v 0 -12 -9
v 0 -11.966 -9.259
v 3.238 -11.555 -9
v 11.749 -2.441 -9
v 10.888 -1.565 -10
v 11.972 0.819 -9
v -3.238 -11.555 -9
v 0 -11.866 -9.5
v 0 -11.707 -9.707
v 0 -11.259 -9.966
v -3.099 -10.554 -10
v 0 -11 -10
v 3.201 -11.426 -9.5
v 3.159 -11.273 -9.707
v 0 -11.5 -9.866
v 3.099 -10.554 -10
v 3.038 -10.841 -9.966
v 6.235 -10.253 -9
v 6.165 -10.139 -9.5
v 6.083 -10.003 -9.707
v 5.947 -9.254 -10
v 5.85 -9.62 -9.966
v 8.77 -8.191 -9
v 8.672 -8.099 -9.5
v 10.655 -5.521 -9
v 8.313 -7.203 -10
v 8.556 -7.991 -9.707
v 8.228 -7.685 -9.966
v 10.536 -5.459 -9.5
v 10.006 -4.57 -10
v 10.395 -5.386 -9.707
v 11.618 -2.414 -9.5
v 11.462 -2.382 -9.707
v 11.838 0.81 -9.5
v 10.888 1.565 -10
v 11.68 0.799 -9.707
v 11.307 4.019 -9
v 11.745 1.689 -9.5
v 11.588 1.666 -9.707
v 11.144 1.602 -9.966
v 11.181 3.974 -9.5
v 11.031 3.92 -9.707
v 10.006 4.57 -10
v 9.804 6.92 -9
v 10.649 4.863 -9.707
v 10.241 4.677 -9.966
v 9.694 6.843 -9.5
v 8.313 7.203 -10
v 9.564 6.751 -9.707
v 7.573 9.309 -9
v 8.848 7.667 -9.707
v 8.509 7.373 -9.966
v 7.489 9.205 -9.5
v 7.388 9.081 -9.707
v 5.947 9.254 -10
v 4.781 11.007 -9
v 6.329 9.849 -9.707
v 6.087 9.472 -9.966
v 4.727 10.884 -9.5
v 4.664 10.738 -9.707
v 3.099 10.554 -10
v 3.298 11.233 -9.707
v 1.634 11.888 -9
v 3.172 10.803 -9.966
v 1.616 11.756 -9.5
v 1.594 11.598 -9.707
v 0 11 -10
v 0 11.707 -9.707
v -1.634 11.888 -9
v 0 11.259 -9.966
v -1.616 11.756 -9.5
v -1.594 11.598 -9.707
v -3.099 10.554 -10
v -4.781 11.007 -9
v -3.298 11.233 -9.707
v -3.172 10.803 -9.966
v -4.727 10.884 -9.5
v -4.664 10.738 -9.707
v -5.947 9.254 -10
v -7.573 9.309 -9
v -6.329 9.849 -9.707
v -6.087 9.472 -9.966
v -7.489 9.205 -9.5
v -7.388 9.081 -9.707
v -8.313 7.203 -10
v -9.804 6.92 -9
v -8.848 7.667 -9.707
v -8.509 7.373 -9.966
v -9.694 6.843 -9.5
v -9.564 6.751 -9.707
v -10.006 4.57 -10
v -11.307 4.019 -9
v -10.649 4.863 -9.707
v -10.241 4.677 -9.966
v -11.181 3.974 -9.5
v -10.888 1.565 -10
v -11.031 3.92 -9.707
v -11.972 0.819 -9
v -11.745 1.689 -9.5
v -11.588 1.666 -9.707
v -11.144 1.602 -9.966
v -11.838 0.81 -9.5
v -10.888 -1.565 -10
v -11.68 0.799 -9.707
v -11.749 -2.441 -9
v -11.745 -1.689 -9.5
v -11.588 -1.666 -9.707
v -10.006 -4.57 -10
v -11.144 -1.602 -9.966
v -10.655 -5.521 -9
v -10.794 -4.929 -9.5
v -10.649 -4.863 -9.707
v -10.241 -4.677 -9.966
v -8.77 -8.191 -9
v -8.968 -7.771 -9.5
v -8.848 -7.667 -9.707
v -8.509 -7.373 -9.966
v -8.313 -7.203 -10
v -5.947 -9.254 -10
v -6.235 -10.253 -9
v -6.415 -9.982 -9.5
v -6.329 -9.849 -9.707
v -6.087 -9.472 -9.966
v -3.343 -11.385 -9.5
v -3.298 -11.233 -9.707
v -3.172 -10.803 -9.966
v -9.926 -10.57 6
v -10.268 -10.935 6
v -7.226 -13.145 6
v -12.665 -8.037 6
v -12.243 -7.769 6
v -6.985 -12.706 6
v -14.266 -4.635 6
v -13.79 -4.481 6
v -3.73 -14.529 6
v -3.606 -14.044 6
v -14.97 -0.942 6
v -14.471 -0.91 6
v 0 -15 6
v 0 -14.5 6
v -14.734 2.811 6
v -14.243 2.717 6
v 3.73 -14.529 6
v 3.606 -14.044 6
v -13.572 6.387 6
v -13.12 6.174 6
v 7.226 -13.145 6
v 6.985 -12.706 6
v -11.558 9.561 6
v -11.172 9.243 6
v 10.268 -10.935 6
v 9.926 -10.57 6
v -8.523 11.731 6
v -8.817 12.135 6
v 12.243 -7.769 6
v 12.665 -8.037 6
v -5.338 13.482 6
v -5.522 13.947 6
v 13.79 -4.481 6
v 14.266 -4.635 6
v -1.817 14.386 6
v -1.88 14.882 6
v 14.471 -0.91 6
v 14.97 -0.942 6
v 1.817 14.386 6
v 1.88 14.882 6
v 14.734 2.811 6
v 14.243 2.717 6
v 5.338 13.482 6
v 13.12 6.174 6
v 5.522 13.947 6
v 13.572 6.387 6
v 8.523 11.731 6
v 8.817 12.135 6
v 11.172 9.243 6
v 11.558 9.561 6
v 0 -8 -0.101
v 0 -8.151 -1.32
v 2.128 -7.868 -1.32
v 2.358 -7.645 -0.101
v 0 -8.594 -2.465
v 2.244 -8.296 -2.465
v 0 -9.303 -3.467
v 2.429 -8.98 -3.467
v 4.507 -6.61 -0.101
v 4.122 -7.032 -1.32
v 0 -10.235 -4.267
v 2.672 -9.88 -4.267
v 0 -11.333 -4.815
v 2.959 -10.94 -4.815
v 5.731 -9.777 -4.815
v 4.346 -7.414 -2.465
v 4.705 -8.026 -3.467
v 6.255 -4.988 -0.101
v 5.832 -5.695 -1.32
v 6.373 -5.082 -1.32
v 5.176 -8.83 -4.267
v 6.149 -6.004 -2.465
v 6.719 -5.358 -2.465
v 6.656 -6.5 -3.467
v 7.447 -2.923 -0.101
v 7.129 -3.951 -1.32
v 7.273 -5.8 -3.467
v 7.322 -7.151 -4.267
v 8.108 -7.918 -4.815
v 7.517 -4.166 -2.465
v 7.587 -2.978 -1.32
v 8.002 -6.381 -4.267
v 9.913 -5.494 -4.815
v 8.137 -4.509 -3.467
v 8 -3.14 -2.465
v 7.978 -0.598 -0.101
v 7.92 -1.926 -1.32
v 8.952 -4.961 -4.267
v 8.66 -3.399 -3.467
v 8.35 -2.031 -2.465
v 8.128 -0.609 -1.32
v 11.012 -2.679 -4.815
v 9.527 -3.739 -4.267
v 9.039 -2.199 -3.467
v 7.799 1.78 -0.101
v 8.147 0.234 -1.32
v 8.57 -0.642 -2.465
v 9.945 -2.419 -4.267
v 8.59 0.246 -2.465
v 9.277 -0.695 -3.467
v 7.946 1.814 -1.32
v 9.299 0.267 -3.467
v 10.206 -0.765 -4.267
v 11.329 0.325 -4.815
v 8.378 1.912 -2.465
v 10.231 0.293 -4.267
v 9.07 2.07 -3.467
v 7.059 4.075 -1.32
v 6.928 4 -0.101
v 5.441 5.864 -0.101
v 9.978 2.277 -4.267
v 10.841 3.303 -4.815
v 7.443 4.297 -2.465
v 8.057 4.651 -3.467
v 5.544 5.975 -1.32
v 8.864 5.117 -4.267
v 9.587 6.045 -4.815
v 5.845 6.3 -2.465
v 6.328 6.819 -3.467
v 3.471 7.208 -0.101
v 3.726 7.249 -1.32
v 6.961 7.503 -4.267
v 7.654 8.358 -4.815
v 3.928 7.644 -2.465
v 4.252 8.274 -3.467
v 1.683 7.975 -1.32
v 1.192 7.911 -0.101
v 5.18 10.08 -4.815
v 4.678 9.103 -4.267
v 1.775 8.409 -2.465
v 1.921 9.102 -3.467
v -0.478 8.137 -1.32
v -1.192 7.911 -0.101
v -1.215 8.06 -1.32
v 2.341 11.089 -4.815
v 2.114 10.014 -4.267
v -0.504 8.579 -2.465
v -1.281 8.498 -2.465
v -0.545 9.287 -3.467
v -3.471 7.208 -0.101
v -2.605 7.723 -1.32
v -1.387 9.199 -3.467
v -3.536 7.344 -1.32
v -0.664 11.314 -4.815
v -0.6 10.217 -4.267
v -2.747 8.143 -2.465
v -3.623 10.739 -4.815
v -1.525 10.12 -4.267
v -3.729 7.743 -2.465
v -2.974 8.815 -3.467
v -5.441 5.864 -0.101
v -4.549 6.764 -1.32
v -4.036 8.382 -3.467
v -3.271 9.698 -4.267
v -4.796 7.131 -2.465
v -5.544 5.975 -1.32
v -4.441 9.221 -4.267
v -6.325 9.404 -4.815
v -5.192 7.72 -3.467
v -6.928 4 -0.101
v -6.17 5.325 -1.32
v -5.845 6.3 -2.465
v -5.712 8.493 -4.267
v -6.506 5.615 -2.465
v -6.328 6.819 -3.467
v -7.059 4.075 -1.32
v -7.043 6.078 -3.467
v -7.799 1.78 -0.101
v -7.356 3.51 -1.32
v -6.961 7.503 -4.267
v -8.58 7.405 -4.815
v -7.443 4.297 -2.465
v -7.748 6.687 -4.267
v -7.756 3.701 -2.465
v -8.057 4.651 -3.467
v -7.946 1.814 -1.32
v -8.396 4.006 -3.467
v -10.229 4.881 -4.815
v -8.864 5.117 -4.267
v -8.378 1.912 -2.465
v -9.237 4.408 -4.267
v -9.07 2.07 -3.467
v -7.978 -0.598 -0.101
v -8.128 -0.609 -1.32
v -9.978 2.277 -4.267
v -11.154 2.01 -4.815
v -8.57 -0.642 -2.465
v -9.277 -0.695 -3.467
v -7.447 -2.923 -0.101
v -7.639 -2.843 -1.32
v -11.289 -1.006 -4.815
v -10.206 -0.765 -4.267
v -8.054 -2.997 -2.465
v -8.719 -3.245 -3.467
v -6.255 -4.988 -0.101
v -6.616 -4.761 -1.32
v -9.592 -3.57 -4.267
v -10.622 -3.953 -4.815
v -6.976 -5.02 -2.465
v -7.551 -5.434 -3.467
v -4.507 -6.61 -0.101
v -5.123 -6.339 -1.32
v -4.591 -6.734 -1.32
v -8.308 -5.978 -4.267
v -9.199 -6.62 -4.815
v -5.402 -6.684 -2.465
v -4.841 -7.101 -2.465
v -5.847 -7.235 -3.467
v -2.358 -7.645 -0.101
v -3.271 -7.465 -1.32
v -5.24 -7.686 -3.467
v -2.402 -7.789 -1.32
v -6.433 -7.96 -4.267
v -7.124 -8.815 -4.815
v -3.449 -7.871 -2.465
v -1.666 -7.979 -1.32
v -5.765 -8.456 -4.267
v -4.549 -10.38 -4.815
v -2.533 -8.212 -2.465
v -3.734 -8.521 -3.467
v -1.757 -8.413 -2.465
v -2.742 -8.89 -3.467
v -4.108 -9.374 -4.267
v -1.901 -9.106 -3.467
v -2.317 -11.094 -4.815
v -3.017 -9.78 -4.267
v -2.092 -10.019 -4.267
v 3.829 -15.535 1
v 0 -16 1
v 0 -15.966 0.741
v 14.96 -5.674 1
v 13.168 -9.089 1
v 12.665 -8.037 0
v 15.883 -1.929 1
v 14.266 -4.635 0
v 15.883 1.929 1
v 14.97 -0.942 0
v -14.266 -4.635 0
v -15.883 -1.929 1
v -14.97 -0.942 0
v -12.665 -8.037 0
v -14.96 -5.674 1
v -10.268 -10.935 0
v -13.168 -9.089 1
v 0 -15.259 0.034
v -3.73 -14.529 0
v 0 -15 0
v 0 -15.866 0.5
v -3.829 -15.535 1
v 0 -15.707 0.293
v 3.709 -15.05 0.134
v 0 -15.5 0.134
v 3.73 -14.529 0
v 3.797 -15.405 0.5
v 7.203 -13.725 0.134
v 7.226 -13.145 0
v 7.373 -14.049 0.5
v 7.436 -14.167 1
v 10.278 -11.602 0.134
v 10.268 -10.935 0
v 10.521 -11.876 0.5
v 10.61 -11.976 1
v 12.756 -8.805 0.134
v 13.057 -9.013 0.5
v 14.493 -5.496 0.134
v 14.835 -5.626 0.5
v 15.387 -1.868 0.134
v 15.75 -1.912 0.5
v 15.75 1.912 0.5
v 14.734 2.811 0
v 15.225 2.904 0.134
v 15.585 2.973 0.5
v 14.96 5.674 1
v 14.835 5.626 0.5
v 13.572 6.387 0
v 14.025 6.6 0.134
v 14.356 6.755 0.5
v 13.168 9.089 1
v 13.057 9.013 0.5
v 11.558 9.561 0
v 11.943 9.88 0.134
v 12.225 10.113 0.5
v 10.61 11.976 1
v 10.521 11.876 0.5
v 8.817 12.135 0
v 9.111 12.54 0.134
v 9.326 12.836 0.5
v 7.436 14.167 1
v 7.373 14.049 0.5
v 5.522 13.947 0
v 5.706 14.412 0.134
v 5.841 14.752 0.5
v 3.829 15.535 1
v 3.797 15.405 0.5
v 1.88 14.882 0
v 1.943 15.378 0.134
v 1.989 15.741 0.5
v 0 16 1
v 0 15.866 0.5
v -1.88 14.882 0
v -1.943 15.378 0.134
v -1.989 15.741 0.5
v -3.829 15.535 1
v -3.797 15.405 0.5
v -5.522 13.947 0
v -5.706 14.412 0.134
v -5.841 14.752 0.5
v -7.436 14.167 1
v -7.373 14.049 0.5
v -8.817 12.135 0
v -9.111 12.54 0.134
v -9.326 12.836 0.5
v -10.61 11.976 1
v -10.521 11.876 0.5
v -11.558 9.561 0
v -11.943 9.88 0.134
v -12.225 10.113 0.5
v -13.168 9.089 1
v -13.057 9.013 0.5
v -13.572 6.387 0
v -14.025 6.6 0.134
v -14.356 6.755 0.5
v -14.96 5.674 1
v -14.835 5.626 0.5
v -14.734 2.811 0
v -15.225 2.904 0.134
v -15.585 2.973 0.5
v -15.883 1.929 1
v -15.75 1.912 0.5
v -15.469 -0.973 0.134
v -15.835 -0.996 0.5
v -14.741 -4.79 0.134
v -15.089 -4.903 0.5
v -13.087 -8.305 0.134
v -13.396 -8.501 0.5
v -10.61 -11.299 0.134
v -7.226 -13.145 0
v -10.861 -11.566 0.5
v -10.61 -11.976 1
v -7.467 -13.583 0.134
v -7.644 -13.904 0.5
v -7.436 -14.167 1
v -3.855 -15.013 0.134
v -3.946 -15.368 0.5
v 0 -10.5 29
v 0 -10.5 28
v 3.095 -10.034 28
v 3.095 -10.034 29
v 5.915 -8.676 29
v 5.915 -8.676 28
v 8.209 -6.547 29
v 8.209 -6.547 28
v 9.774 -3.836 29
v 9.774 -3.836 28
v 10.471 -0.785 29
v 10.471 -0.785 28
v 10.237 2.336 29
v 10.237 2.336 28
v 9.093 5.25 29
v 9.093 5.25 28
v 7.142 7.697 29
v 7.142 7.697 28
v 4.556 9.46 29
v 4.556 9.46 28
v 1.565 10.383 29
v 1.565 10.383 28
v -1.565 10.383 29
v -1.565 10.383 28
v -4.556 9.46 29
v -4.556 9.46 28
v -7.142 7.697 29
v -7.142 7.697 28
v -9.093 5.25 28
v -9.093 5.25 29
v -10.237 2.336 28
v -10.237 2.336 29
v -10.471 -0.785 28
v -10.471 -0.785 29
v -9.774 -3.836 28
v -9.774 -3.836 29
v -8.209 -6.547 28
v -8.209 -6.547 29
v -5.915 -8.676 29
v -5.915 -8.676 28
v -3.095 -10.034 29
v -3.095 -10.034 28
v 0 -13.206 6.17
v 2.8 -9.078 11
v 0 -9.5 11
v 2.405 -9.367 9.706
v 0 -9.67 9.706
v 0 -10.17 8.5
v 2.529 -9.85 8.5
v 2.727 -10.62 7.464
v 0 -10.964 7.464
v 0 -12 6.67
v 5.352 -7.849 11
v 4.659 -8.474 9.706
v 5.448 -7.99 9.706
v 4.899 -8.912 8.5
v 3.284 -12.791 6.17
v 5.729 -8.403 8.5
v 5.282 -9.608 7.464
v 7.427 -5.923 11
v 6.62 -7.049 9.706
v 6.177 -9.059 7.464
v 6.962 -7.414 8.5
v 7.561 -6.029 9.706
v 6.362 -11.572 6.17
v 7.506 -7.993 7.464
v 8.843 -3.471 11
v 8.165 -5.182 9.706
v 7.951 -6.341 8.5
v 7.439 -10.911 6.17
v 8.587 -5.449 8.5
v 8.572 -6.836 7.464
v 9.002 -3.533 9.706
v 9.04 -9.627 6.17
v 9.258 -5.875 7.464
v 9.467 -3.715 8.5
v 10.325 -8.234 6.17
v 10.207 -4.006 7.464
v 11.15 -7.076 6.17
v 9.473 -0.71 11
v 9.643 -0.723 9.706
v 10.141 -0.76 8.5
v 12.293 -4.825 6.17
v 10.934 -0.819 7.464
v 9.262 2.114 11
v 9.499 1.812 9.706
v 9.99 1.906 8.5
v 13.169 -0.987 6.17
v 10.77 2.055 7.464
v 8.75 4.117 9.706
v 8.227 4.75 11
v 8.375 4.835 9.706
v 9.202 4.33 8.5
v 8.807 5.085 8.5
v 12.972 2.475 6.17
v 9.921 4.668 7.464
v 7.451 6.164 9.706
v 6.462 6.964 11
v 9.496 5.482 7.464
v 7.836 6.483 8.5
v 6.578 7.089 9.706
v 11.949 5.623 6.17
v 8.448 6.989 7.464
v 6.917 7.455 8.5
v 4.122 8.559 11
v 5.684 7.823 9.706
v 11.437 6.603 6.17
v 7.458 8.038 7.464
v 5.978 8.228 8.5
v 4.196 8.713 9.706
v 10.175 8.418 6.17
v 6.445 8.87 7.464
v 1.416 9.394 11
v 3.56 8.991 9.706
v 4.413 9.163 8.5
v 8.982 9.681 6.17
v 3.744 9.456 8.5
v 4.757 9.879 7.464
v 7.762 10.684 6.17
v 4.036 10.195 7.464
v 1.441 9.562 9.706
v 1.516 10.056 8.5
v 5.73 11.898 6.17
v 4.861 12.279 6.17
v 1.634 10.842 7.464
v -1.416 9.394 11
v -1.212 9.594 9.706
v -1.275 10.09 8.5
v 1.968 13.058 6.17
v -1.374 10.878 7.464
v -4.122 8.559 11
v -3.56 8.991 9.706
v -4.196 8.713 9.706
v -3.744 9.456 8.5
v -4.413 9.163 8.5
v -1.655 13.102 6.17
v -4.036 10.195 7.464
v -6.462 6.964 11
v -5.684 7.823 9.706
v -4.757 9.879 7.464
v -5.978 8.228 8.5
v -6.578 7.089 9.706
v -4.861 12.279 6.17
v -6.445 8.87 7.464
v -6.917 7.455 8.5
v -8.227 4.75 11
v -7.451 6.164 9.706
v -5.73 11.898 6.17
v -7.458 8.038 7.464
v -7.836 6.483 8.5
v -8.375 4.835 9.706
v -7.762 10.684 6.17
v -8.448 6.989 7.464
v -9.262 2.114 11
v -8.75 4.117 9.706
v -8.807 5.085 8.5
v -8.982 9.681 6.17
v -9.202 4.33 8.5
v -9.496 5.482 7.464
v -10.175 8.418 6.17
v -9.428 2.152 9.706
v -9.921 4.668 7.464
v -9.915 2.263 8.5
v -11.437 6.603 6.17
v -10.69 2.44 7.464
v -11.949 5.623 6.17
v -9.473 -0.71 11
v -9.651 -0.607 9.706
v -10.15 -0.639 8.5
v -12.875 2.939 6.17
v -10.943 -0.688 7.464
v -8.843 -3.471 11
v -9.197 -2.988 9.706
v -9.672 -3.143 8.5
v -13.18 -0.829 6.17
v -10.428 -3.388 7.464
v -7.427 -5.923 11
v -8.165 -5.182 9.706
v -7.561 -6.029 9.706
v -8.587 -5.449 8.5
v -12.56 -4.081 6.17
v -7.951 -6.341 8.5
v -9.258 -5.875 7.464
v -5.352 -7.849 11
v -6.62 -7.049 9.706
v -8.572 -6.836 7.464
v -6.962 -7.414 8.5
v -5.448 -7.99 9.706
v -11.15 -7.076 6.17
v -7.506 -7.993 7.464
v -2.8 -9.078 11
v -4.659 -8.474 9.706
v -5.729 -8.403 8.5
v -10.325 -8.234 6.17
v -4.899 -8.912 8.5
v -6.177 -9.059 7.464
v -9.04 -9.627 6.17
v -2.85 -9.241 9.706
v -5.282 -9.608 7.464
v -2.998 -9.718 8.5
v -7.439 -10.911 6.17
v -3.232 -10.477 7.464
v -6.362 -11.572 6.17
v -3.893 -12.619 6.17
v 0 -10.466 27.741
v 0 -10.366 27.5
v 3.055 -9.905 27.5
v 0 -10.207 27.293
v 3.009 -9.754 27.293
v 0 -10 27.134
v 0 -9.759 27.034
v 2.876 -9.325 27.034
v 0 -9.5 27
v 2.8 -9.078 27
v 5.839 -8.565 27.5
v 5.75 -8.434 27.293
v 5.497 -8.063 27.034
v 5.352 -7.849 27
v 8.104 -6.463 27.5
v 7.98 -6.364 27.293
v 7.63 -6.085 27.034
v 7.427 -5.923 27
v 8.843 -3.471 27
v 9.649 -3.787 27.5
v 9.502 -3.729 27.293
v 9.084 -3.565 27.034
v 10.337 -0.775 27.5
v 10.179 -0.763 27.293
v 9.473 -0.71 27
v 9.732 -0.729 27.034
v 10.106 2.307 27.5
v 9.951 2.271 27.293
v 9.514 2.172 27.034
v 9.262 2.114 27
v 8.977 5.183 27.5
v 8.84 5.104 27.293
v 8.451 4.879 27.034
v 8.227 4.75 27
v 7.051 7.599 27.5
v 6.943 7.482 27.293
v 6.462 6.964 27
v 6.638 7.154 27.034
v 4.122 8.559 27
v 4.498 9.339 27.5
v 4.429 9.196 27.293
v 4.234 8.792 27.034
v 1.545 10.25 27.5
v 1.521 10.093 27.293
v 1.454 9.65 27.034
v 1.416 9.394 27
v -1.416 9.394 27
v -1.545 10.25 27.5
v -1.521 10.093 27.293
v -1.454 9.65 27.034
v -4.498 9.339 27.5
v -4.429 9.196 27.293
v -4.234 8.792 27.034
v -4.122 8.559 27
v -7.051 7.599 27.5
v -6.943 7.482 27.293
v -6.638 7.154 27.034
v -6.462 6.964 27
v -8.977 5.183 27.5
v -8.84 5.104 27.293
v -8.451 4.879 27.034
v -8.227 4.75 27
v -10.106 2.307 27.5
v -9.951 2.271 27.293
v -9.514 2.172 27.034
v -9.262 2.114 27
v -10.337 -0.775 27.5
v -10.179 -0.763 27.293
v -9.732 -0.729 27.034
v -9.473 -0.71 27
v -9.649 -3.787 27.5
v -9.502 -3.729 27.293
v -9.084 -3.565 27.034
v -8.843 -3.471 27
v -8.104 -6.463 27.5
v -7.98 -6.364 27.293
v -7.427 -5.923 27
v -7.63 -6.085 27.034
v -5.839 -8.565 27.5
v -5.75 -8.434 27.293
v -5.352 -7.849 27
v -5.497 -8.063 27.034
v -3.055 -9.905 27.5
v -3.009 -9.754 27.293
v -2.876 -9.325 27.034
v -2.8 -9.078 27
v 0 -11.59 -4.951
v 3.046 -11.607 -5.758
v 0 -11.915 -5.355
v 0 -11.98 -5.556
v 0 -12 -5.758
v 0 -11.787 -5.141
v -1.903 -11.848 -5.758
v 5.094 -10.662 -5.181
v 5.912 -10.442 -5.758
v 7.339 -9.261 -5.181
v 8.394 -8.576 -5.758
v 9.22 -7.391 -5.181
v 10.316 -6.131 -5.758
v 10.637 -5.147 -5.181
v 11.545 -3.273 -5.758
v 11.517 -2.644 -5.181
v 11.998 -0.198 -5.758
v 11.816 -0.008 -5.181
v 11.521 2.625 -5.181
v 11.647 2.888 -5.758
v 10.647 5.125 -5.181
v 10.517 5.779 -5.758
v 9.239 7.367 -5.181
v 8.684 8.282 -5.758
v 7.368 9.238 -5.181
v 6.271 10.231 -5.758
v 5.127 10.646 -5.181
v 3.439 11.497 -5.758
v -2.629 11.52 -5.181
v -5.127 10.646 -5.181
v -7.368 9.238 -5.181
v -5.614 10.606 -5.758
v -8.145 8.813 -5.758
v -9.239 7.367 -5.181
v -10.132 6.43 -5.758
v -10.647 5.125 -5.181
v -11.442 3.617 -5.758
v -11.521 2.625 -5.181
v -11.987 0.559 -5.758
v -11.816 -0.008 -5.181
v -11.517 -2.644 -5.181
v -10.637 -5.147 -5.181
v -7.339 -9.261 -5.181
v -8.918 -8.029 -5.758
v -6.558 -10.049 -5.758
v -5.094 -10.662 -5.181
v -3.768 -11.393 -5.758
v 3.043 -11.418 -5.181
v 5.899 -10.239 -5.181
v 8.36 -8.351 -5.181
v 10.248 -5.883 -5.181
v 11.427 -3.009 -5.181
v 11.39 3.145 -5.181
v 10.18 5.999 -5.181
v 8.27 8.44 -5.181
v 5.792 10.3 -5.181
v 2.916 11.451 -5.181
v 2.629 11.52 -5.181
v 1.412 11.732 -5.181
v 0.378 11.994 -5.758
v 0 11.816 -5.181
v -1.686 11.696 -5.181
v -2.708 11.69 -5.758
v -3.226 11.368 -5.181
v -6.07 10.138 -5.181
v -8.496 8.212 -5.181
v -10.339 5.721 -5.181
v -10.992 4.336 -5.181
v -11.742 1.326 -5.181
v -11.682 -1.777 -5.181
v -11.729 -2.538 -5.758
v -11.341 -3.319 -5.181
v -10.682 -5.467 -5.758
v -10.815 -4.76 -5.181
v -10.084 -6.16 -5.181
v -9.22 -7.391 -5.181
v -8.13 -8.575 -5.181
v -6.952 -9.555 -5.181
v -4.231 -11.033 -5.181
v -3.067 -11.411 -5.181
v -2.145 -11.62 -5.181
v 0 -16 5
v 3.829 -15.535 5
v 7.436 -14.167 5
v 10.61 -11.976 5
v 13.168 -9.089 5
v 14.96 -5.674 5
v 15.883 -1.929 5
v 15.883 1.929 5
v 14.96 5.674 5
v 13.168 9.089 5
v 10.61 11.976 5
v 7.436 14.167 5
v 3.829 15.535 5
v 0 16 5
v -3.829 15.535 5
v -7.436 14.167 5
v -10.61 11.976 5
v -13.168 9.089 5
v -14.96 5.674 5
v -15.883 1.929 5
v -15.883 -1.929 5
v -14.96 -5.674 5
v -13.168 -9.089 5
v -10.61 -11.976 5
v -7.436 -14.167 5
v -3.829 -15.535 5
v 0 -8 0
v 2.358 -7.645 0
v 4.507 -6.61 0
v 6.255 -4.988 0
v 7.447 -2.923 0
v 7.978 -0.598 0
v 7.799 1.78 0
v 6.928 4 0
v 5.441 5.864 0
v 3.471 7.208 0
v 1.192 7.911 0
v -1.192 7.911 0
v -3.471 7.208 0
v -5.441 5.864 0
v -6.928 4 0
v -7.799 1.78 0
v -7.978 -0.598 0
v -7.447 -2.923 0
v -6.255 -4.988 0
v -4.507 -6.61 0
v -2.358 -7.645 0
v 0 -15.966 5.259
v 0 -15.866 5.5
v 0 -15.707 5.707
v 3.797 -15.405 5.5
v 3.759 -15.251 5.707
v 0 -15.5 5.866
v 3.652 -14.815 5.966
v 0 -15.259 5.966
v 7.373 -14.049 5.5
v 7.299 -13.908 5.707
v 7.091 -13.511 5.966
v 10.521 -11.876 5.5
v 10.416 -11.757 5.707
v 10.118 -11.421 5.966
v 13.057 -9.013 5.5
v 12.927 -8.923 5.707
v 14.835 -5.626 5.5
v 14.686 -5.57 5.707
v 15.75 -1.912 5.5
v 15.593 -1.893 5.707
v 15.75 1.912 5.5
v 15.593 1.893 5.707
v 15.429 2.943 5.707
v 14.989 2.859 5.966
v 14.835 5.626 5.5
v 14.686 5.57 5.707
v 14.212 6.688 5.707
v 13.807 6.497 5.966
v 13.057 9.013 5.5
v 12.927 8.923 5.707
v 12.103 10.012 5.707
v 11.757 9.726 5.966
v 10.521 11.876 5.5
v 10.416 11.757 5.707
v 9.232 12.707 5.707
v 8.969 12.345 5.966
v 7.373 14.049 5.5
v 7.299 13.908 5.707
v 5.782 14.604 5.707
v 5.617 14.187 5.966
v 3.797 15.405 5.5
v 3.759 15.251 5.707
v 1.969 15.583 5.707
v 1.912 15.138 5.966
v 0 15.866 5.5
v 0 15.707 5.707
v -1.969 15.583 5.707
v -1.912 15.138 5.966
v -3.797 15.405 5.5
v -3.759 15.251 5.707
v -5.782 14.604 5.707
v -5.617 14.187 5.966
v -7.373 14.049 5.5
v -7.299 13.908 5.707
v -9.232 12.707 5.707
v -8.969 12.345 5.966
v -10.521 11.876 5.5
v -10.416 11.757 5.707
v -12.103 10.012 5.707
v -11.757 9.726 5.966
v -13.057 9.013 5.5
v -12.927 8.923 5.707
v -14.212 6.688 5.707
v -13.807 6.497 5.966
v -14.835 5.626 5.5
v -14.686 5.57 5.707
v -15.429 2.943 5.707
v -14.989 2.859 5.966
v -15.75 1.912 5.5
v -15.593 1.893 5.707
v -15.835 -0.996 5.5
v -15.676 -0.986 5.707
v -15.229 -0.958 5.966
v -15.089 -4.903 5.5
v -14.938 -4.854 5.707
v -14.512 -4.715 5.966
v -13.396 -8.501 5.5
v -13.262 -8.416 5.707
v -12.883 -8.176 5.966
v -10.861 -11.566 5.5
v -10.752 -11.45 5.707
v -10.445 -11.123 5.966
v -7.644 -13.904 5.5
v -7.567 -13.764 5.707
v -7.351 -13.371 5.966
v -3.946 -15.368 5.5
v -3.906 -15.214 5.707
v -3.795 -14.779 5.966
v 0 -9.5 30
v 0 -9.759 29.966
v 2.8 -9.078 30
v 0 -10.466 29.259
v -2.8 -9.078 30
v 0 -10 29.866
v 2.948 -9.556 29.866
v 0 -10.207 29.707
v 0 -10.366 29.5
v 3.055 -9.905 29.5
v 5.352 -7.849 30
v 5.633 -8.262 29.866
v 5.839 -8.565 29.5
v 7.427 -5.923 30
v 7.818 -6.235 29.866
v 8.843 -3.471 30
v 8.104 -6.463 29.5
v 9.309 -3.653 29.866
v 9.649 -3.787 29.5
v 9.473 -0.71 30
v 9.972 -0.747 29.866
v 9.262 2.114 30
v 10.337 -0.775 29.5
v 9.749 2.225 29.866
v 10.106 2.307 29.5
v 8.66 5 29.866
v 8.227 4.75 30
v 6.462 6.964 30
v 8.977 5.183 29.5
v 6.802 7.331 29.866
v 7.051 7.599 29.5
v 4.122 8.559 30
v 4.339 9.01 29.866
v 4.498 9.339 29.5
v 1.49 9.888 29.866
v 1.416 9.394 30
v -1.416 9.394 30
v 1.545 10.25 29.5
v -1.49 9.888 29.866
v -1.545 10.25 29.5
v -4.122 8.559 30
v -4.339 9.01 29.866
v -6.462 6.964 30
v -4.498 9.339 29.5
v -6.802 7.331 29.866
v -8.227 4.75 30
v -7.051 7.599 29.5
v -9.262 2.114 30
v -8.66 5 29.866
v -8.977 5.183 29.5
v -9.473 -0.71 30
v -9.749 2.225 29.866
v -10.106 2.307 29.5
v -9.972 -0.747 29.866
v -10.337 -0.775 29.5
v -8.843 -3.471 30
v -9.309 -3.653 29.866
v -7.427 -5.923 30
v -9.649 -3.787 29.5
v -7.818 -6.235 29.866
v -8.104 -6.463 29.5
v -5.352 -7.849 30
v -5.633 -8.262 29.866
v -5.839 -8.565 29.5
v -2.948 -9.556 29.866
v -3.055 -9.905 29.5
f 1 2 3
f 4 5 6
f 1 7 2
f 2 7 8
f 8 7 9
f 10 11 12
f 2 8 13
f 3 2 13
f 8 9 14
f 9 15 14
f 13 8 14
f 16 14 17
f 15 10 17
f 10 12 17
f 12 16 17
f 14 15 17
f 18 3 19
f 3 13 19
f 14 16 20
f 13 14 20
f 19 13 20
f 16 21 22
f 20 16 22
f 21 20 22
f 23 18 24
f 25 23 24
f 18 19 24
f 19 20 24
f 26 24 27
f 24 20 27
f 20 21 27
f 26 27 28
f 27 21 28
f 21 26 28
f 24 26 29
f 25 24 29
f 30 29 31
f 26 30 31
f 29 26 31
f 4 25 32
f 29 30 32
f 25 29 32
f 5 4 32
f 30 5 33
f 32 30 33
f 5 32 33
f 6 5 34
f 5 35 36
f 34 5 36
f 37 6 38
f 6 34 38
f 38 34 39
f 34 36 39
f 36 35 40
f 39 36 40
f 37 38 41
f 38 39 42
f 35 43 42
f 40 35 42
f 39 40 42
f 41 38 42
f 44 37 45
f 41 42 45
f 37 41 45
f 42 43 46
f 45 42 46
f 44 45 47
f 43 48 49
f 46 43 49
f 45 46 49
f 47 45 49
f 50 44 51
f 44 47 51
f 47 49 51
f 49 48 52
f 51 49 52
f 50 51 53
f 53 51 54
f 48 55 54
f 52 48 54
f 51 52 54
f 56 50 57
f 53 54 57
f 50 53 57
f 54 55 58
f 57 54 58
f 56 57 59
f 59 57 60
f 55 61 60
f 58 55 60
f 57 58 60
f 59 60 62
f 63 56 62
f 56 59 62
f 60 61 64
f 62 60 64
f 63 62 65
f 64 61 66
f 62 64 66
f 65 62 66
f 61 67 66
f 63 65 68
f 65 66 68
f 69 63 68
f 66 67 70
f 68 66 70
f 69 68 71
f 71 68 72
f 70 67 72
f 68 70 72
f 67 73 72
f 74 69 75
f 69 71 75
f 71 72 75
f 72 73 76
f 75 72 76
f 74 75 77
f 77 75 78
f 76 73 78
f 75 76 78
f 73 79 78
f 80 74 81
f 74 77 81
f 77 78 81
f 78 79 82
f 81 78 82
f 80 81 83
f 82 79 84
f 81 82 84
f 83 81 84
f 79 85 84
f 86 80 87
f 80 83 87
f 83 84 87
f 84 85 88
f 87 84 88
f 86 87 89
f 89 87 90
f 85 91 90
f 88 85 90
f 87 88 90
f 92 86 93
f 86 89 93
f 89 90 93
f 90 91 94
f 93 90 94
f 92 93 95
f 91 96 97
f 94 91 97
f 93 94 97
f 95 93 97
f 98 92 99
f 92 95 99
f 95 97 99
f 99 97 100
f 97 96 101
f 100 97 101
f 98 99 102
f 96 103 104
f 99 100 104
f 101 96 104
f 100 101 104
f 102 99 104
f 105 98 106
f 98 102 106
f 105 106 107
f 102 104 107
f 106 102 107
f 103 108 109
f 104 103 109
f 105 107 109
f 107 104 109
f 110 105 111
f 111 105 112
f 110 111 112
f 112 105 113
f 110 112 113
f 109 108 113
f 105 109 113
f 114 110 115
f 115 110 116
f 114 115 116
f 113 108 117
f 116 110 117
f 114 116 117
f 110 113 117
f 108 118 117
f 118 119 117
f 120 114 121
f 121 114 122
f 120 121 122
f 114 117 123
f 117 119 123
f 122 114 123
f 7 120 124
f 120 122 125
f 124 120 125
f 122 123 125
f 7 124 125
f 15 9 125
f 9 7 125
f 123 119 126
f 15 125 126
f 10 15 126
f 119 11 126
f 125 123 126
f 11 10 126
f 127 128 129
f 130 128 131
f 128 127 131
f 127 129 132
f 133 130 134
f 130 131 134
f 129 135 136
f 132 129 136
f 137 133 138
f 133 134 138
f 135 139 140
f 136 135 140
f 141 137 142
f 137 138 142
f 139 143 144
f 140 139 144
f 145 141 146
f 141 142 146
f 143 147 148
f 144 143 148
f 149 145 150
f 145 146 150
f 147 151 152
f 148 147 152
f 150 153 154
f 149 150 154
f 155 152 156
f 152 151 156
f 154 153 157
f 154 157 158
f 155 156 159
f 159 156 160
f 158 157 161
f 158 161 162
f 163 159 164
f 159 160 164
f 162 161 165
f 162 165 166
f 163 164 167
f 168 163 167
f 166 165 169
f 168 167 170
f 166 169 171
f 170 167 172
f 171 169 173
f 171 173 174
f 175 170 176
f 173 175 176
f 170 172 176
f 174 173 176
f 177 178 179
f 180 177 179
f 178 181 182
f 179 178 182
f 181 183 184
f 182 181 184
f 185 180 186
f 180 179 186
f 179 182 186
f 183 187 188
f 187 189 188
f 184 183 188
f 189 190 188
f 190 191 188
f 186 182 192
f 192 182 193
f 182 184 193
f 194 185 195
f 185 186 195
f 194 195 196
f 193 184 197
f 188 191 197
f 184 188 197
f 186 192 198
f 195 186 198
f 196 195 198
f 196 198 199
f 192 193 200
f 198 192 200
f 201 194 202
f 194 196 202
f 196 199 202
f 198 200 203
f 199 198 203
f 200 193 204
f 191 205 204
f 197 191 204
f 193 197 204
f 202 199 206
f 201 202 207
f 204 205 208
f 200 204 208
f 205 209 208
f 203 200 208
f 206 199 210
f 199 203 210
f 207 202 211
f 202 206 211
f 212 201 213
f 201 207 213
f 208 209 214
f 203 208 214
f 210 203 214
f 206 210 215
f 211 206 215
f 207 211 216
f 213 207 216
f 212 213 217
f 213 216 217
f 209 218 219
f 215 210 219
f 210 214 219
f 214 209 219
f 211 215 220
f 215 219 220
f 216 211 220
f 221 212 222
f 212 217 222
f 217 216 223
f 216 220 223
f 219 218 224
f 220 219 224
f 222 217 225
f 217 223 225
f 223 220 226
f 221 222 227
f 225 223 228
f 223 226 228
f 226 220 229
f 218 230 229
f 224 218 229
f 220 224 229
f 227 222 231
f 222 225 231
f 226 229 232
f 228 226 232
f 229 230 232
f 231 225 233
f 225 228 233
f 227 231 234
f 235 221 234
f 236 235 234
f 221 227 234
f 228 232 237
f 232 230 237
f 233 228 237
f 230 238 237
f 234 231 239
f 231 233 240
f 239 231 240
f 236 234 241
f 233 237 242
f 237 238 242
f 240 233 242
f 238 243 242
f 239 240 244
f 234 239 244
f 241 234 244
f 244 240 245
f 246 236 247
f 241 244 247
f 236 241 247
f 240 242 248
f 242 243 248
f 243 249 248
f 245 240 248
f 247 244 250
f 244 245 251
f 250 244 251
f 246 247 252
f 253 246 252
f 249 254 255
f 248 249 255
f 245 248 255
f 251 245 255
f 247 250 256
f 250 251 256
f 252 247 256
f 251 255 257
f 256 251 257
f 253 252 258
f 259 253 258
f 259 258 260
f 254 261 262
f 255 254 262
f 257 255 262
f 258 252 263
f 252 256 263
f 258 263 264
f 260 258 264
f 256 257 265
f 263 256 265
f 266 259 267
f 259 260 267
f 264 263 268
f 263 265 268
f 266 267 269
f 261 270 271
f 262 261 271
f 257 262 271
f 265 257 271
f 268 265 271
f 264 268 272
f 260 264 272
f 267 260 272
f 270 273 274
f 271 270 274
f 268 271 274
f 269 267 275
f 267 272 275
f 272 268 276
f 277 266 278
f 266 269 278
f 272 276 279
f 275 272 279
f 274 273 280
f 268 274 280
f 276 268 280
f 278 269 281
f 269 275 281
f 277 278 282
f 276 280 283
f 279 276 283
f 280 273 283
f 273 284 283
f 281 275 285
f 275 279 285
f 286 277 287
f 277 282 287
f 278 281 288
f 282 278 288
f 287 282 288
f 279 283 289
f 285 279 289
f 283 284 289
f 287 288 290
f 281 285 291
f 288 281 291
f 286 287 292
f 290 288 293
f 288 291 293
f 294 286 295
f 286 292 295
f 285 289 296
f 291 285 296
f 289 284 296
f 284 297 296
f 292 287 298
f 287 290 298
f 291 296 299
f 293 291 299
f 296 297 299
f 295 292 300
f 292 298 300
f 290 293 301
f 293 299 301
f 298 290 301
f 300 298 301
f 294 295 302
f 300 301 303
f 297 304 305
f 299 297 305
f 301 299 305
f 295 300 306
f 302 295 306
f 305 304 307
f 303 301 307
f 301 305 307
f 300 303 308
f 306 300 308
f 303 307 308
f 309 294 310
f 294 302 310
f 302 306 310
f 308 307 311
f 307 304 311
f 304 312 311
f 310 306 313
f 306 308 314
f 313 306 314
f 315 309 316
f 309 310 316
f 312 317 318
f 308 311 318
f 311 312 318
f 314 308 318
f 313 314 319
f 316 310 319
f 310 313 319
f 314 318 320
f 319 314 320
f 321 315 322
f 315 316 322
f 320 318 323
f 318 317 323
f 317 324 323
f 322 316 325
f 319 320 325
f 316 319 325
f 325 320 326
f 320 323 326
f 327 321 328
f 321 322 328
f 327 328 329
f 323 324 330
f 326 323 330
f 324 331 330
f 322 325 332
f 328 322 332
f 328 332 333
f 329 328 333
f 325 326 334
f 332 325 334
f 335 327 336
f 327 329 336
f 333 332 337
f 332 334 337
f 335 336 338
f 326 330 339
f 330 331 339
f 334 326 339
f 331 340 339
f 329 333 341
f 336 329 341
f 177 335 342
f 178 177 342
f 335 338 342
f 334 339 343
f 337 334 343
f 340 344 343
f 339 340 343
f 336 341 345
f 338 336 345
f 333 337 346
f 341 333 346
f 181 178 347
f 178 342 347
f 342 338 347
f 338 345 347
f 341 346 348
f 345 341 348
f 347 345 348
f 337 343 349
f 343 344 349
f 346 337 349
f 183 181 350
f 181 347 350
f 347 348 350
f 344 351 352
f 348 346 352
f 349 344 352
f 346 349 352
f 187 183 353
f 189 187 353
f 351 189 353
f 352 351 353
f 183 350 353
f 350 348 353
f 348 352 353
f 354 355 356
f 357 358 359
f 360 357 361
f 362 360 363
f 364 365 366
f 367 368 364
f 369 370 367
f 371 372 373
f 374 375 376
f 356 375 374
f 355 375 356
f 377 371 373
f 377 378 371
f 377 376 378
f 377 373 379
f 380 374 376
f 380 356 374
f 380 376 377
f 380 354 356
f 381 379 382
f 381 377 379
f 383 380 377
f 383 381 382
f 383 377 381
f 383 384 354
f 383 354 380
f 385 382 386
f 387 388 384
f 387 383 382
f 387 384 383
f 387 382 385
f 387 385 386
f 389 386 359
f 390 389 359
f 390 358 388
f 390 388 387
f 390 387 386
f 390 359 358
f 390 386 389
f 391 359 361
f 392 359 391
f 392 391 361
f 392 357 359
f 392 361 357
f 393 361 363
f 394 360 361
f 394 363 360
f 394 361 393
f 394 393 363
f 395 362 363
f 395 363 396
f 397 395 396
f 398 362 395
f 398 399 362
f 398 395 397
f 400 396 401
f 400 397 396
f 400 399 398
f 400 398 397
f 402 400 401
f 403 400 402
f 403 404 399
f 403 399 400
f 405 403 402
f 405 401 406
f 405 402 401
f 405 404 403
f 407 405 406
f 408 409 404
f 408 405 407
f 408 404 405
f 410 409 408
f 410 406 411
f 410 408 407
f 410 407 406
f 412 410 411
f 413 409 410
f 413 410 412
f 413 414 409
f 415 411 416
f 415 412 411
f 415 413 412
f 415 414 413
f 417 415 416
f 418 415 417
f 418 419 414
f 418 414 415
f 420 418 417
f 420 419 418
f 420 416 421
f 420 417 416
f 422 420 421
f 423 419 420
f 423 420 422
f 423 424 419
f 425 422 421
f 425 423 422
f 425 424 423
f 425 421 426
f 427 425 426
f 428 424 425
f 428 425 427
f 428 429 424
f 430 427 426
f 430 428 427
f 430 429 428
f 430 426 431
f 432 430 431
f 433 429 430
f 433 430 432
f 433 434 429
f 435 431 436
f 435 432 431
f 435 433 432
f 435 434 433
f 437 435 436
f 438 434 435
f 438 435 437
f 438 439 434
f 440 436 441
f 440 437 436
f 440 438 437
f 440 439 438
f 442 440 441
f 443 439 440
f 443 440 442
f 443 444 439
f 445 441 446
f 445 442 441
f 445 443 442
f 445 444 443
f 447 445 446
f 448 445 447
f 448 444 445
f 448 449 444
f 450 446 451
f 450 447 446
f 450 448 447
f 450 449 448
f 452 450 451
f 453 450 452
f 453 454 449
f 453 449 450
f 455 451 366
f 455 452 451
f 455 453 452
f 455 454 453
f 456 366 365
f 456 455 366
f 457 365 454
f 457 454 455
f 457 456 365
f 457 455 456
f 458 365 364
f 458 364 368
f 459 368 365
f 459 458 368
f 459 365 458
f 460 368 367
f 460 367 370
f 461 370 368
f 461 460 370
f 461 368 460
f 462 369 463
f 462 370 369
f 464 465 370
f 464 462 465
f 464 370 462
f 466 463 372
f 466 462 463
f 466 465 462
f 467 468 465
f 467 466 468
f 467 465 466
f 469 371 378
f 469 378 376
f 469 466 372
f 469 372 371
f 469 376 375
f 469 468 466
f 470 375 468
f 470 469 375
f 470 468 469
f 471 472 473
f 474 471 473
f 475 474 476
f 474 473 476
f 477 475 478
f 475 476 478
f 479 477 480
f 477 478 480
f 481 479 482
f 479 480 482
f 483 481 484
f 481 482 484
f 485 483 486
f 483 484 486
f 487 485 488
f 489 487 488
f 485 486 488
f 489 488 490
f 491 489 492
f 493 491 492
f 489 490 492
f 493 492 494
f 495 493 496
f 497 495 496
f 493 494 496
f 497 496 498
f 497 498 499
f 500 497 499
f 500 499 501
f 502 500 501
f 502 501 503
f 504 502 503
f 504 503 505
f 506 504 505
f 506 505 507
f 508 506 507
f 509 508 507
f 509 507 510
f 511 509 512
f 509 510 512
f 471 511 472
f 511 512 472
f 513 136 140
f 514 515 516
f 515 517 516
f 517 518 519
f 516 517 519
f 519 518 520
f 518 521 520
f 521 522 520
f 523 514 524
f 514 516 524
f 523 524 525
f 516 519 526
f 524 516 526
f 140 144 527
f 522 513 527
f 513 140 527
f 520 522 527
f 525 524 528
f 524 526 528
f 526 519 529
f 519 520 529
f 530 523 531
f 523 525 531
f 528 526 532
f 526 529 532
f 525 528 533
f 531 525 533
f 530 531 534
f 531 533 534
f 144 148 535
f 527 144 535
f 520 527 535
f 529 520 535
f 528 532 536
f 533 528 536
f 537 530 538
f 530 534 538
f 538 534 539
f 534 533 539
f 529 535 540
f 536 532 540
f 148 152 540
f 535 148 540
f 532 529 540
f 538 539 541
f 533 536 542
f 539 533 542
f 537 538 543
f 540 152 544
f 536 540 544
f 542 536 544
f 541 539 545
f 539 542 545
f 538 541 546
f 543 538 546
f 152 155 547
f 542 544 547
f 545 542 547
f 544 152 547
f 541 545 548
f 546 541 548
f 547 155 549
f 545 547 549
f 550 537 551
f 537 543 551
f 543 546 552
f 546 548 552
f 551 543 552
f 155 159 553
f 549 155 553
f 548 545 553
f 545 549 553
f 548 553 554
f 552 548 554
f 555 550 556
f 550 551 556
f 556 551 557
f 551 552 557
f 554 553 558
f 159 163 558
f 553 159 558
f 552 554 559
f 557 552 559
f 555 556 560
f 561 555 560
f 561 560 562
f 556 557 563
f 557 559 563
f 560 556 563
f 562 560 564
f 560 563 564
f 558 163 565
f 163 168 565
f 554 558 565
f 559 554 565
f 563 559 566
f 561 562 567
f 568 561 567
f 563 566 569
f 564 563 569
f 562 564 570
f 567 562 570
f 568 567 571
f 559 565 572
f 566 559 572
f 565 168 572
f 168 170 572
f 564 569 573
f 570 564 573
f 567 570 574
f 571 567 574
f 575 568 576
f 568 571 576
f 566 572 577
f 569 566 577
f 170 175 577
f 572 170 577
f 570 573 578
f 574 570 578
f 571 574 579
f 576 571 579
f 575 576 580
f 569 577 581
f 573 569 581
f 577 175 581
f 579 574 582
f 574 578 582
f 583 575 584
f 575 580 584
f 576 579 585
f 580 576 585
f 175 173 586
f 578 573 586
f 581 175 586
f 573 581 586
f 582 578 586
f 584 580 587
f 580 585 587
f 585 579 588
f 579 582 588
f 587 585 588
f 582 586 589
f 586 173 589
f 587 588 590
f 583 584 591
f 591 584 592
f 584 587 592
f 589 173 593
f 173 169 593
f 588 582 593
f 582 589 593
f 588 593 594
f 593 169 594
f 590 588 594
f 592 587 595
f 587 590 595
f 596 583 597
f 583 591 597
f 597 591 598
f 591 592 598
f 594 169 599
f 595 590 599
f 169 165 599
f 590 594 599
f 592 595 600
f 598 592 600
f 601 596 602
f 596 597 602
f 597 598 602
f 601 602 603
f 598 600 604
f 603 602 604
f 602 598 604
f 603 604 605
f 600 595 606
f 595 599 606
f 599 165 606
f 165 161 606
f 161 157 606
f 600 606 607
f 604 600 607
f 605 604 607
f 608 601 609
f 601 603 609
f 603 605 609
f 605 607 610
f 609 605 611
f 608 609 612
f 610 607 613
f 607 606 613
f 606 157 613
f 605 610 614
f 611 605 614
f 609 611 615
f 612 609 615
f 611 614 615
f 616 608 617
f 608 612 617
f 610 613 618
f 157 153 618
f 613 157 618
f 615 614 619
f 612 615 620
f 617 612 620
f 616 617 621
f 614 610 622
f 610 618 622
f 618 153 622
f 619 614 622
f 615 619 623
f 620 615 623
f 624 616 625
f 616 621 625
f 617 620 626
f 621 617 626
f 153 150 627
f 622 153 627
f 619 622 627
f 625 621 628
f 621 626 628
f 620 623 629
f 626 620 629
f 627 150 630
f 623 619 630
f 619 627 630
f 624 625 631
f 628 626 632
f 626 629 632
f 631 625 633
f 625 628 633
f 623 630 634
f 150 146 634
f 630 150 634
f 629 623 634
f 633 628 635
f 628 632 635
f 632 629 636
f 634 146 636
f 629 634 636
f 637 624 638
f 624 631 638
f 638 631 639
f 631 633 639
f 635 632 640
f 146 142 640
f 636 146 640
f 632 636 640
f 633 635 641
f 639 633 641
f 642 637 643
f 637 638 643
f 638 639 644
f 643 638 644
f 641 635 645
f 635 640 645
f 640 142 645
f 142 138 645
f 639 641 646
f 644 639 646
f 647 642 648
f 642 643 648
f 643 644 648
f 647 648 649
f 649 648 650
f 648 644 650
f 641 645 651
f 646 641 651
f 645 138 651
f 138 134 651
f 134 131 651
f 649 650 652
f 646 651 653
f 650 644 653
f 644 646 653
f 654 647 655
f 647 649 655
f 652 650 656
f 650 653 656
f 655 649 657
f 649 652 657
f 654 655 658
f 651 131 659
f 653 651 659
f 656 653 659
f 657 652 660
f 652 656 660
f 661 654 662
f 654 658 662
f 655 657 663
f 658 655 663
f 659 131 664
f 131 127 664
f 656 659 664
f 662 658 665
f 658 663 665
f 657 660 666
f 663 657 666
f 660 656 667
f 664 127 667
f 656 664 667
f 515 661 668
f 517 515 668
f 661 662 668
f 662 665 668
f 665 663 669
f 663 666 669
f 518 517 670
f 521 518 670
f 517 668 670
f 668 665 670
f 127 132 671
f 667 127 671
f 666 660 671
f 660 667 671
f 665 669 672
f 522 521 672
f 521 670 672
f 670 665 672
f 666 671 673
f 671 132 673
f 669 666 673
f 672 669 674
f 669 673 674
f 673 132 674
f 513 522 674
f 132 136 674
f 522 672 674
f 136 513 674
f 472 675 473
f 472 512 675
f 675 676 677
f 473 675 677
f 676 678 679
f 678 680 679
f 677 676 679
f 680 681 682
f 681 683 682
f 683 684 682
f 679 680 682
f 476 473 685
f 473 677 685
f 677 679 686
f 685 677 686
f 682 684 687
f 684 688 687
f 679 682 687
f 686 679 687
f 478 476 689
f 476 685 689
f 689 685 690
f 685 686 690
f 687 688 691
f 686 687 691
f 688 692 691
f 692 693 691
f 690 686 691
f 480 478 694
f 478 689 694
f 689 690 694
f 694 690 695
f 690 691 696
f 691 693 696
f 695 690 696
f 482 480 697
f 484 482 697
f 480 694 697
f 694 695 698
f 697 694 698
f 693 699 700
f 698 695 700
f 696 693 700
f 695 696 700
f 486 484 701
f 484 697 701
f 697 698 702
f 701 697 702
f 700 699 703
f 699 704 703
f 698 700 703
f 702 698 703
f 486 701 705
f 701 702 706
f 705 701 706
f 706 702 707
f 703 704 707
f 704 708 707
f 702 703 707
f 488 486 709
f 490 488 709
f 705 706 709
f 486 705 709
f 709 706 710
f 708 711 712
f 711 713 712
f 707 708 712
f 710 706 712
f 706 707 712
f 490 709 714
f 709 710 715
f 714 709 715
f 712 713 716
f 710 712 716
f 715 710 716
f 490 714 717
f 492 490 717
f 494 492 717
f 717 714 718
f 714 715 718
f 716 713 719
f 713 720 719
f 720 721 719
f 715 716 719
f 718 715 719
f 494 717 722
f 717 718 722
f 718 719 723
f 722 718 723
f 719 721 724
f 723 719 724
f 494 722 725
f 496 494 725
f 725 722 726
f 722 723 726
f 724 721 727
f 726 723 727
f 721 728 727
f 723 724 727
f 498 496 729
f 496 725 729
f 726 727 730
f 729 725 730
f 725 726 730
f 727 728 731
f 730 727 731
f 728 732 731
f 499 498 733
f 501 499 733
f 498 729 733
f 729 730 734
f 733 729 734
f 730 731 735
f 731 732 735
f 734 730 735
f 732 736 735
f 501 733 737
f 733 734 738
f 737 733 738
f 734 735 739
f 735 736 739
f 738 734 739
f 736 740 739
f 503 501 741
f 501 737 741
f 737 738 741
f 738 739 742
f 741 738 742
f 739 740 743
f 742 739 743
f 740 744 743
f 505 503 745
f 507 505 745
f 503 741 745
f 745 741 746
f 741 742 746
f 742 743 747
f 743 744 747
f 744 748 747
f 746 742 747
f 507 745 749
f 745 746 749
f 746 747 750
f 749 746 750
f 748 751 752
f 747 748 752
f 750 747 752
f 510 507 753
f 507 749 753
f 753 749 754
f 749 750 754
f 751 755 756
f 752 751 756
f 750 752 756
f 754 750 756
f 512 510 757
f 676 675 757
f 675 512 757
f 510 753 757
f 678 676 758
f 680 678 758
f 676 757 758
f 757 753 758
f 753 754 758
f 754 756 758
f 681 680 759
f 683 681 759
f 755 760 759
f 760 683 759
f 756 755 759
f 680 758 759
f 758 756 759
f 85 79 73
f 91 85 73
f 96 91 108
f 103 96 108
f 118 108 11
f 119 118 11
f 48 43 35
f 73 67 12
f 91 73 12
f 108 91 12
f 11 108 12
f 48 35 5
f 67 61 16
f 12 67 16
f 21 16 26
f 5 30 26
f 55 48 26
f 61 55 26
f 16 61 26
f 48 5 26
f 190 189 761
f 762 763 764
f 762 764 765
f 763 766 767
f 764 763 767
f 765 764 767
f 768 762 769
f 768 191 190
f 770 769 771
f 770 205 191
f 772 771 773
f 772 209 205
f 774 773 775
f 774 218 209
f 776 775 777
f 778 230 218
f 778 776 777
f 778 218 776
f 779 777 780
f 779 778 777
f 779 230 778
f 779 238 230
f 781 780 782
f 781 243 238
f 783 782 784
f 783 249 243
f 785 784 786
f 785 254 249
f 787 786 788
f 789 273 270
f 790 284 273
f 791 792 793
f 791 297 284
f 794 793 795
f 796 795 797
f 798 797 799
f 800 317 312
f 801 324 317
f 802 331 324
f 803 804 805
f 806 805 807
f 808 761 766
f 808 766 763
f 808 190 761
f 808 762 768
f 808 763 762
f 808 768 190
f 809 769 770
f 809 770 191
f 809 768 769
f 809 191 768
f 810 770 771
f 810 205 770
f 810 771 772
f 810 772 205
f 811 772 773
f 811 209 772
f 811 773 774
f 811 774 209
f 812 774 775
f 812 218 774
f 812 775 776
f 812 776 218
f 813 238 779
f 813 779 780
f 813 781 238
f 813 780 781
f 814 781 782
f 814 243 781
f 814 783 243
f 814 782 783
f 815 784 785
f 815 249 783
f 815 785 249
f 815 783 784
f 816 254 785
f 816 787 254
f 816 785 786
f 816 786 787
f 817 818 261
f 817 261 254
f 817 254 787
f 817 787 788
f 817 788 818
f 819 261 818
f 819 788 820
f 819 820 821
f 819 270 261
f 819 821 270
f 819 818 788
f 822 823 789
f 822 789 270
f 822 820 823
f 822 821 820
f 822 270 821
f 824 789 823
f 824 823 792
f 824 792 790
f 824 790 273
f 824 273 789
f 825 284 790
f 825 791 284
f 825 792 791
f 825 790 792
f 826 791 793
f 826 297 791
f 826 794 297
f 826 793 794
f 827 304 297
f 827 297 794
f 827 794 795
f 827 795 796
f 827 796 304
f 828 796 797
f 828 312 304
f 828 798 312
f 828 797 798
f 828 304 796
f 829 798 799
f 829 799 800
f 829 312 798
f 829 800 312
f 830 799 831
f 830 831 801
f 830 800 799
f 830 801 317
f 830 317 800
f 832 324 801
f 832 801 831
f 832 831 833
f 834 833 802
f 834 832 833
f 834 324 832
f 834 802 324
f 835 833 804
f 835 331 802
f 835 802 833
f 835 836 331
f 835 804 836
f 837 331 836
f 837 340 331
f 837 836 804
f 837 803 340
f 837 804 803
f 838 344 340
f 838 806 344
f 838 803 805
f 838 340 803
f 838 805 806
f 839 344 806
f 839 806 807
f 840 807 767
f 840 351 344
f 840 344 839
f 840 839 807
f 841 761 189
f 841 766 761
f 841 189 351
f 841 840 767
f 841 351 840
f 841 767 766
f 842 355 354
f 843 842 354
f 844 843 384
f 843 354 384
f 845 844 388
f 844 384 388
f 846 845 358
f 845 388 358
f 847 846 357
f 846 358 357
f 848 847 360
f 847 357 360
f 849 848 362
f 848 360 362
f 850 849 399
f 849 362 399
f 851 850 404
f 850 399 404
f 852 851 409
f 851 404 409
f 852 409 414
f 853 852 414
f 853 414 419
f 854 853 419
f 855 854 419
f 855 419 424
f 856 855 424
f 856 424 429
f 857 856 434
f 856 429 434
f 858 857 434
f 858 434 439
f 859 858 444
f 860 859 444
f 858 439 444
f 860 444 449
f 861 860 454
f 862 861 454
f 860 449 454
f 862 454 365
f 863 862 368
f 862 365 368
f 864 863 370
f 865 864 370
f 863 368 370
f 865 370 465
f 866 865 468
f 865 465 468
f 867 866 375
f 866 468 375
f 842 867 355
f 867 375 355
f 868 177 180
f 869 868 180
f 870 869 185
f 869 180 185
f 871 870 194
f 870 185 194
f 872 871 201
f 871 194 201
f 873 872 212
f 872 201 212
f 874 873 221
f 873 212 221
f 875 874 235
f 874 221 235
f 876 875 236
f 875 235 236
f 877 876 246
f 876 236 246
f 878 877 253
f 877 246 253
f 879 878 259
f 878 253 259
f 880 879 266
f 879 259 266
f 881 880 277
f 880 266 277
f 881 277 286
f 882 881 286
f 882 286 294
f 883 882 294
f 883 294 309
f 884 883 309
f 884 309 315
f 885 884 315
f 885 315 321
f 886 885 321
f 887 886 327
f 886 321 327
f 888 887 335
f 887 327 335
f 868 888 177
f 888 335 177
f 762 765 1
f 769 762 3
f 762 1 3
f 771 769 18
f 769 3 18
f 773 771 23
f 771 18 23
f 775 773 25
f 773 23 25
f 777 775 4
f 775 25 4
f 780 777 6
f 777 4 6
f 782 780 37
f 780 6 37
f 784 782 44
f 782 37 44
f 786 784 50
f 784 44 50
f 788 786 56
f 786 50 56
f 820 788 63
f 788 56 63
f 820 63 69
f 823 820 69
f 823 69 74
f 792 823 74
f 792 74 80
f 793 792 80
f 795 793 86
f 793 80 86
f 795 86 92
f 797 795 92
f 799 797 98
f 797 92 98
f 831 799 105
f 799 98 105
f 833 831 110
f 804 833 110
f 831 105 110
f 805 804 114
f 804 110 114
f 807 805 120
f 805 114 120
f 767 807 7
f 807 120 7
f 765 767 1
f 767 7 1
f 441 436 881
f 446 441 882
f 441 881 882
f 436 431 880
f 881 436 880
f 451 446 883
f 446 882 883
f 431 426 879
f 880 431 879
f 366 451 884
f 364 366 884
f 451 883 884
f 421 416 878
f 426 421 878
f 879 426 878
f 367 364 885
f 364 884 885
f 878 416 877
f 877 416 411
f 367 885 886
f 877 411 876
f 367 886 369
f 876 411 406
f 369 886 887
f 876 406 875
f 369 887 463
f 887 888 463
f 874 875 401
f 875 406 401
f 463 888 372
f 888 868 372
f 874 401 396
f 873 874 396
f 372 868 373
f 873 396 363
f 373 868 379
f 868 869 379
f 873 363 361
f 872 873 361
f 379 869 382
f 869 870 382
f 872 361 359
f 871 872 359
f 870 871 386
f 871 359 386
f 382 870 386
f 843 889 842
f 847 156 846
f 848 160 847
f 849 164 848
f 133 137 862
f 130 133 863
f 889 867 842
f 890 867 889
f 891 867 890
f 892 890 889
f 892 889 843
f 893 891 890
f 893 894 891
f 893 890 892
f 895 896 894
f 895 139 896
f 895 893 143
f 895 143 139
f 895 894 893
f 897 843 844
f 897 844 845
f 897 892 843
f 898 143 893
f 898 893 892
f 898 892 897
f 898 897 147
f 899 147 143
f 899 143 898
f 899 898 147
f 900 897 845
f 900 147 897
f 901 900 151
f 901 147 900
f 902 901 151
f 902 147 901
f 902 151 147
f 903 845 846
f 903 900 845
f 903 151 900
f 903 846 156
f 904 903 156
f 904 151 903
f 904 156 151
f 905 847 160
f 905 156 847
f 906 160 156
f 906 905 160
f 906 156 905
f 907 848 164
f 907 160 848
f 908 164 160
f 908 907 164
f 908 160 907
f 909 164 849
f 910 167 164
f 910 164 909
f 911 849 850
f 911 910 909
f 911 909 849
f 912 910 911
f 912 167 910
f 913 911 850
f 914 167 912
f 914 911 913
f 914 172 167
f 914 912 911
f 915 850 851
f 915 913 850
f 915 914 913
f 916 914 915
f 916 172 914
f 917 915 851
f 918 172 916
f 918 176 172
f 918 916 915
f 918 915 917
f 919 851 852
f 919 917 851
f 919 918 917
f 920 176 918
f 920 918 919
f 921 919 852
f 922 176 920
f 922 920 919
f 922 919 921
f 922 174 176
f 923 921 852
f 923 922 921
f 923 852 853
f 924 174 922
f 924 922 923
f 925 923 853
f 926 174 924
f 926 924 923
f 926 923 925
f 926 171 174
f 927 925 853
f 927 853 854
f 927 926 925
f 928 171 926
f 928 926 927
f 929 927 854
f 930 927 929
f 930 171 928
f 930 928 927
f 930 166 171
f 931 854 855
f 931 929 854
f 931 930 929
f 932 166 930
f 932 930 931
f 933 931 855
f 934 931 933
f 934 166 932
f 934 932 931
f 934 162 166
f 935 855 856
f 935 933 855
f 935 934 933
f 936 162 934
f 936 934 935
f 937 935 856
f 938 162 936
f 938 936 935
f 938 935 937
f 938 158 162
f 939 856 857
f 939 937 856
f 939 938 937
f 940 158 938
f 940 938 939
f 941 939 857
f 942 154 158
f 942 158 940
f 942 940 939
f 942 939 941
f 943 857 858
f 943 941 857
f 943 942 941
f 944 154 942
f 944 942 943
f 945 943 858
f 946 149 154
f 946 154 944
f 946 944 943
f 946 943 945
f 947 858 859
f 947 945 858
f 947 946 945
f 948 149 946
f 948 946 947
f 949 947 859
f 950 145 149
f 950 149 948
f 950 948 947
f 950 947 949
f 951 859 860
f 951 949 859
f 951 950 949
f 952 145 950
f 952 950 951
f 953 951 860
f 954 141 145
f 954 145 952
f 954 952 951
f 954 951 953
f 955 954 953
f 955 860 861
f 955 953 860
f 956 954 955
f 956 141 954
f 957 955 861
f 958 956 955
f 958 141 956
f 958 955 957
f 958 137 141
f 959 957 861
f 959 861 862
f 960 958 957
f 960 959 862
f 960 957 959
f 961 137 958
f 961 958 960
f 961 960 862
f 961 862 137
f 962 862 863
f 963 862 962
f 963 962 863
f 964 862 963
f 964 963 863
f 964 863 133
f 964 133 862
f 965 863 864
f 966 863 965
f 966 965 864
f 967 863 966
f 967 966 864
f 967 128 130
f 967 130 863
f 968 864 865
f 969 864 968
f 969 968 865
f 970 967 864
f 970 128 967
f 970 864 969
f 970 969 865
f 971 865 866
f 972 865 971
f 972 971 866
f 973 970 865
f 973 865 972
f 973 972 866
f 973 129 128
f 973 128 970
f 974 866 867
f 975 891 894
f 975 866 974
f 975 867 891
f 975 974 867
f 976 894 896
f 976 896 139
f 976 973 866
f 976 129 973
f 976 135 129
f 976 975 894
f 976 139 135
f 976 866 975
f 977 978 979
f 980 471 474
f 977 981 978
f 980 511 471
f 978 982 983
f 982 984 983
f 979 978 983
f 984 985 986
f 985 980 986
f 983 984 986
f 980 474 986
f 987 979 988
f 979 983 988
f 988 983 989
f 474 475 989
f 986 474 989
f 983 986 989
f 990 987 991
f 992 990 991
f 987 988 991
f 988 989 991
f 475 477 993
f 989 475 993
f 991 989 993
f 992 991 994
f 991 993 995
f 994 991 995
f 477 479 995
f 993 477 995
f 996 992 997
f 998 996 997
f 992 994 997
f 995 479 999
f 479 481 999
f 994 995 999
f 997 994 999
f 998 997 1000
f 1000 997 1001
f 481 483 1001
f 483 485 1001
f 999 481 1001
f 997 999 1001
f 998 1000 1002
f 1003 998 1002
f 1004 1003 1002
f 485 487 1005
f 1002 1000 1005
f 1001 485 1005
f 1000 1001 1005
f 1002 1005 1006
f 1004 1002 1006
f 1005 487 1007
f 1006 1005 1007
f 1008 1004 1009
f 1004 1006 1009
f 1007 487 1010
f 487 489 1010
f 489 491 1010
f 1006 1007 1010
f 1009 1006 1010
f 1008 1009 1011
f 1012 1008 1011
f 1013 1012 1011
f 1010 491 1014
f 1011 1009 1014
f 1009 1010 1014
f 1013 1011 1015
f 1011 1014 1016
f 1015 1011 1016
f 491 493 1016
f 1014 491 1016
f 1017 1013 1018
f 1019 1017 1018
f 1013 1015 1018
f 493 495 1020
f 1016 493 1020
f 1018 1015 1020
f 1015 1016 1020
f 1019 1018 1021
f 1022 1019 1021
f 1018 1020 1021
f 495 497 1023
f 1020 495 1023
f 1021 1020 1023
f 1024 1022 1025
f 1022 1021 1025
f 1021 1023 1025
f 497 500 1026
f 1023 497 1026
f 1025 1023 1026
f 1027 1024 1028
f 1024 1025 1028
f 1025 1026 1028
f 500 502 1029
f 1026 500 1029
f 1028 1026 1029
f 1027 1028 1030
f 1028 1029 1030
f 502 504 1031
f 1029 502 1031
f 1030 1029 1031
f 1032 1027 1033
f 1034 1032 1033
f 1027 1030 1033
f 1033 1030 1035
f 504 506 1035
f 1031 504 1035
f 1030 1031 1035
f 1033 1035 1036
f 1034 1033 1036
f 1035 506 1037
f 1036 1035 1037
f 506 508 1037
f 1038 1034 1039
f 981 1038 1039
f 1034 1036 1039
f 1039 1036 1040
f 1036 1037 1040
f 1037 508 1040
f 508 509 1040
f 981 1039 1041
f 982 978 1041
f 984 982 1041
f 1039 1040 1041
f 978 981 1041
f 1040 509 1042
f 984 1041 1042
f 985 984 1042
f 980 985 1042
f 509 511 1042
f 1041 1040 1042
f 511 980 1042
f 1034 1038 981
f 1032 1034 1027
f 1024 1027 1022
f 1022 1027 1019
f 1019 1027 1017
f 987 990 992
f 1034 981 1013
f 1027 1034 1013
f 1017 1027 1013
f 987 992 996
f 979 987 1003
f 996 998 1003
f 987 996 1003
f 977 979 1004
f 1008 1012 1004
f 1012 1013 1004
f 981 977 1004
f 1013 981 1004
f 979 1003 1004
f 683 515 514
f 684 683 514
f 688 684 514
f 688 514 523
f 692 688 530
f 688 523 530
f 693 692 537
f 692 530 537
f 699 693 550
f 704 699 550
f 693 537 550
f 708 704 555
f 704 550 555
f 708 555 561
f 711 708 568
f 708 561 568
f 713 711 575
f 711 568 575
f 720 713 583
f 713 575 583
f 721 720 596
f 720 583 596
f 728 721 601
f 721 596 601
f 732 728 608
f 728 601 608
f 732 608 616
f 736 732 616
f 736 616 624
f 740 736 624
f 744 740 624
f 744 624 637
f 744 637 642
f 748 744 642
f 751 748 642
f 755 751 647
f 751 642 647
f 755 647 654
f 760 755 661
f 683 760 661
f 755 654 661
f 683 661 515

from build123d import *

# Parameters (mm, degrees)
F2_R = 0.99999
F4_R = 1


# Not quite as in the source:
# - a fillet or chamfer that OpenCascade refuses, or shapes differently, is made with other operations: its cross-section is extruded or revolved along the edge and cut away or added
# - a fillet or chamfer is up to 0.001 mm smaller than in the source, because OpenCascade refuses the exact size


with BuildPart() as f1:
    # F0 (on Right) → F1 (revolve)
    with BuildSketch(Plane.YZ):
        Polygon((0, -10), (0, 0), (-8, 0), (-8, -5), (-12, -5), (-12, -10), align=None)
        Polygon((-8, 0), (0, 0), (0, 30), (-10.5, 30), (-10.5, 27), (-9.5, 27), (-9.5, 6), (-16, 6), (-16, 0), align=None)
    revolve(axis=Axis((0, 0, 25.4025327901), (0, 0, 1)))

    # F2 (radius 1 in the source; OpenCascade refuses exactly that, so slightly less here)
    f2_edges = [f1.edges().sort_by_distance(p)[0] for p in [
        (0, 10.5, 30),
        (0, 10.5, 27),
    ]]
    fillet(f2_edges, radius=F2_R)

    # F3: fillet of radius 5 on 2 edges, made by hand

    # F3_s1 → F3_t2 (revolve)
    with BuildSketch(Plane.YZ):
        with BuildLine():
            ThreePointArc((-9.5, 11), (-10.9644660941, 7.4644660941), (-14.5, 6))
            Line((-14.5, 6), (-9.5, 6))
            Line((-9.5, 6), (-9.5, 11))
        make_face()
    revolve(axis=Axis((0, 0, 6), (0, 0, 1)))

    # F3_s3 → F3_t4 (revolve)
    with BuildSketch(Plane.YZ):
        with BuildLine():
            ThreePointArc((-8, -0.1010205144), (-9.1270166538, -3.2632981746), (-12, -5))
            Line((-12, -5), (-8, -5))
            Line((-8, -5), (-8, -0.1010205144))
        make_face()
    revolve(axis=Axis((0, 0, -5), (0, 0, 1)))

    # F4
    f4_edges = [f1.edges().sort_by_distance(p)[0] for p in [
        (0, 16, 6),
        (0, 16, 0),
        (0, 12, -5),
        (0, 12, -10),
    ]]
    fillet(f4_edges, radius=F4_R)


solid = f1.part
